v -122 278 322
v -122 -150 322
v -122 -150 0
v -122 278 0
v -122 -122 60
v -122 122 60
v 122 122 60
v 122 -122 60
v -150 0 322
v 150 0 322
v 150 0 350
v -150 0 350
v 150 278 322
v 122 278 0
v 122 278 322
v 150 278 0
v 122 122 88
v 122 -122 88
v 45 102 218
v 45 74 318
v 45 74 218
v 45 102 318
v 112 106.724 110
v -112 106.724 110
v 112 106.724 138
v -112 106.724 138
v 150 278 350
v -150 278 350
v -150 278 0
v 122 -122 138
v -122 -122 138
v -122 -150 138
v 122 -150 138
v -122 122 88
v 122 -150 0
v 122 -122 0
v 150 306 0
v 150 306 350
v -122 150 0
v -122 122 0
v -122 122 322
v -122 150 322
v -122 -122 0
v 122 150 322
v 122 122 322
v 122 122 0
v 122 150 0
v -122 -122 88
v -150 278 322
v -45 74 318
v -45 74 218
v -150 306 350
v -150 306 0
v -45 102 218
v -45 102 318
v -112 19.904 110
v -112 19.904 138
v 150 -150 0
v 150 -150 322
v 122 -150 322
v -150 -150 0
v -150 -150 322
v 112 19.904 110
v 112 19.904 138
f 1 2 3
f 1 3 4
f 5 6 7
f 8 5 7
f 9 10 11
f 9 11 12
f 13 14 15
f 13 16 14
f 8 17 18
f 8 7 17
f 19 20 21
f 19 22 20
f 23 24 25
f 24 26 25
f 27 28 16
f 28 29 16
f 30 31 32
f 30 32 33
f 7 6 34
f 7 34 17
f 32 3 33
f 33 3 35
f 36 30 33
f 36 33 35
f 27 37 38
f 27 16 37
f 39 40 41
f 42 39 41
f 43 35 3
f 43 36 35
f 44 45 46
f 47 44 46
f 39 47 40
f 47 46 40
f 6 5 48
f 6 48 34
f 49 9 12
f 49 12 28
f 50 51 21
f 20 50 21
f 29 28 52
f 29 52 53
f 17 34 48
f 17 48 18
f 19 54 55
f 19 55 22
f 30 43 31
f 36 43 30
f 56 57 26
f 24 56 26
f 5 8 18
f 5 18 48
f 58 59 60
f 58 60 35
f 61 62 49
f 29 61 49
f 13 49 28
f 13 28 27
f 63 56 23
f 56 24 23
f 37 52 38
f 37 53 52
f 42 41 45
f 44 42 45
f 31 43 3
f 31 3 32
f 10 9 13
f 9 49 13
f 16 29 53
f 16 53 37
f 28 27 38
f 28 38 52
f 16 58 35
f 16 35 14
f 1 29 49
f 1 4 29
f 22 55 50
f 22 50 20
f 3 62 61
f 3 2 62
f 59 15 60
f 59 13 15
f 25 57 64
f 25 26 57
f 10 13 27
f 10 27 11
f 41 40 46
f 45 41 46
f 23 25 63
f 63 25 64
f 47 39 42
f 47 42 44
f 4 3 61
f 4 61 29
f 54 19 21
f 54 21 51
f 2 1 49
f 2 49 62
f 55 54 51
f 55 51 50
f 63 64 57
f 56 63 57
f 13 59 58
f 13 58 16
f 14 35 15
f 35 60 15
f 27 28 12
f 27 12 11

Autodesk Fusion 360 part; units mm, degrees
ref_plane "WorkPlane1" through (0, 0, 60) normal (0, 0, 1) x (1, 0, 0) in component "Base"
sketch "Sketch1" plane through (0, 0, 60) normal (0, 0, 1) x (1, 0, 0) in component "Base"
  line L0 (122, -122) -> (-122, -122)
  line L1 (-122, -122) -> (-122, 122)
  line L2 (-122, 122) -> (122, 122)
  line L3 (122, 122) -> (122, -122)
  line L4 (122, -122) -> (-122, 122) construction
  line L5 (-122, -122) -> (122, 122) construction
  dimension "d8" = 244
  dimension "d9" = 244
extrude "Extrude1" add sketch "Sketch1" along normal blind 28 makes body 1 in component "Base"
ref_plane "WorkPlane1" through (0, -122, 0) normal (0, 1, 0) x (0, 0, 1) in component "Front"
sketch "Sketch1 (2)" plane through (0, -122, 0) normal (0, 1, 0) x (1, 0, 0) in component "Front"
  line L0 (122, 0) -> (-122, 0)
  line L1 (-122, 0) -> (-122, -138)
  line L2 (-122, -138) -> (122, -138)
  line L3 (122, -138) -> (122, 0)
  line L4 (122, 0) -> (-122, -138) construction
  line L5 (-122, 0) -> (122, -138) construction
  point P0 (0, -69)
  dimension "d15" = 244
  dimension "d16" = 138
extrude "Extrude1'" add sketch "Sketch1 (2)" against normal blind 28 separate body makes body 2 in component "Front"
ref_plane "WorkPlane1" through (0, 122, 0) normal (0, 1, 0) x (0, 0, 1) in component "Rear"
sketch "Sketch1 (3)" plane through (0, 122, 0) normal (0, 1, 0) x (1, 0, 0) in component "Rear"
  line L0 (-122, -322) -> (122, -322)
  line L1 (122, -322) -> (122, 0)
  line L2 (122, 0) -> (-122, 0)
  line L3 (-122, 0) -> (-122, -322)
  line L4 (-122, -322) -> (122, 0) construction
  line L5 (122, -322) -> (-122, 0) construction
  point P0 (0, -161)
  dimension "d21" = 244
  dimension "d22" = 322
extrude "Extrude1''" add sketch "Sketch1 (3)" along normal blind 28 separate body makes body 3 in component "Rear"
ref_plane "WorkPlane1" through (-122, 0, 0) normal (1, 0, 0) x (0, 1, 0) in component "Side"
sketch "Sketch1 (4)" plane through (-122, 0, 0) normal (1, 0, 0) x (0, 1, 0) in component "Side"
  line L0 (-150, 0) -> (278, 0)
  line L1 (278, 0) -> (278, 322)
  line L2 (278, 322) -> (-150, 322)
  line L3 (-150, 322) -> (-150, 0)
  line L4 (-150, 0) -> (278, 322) construction
  line L5 (278, 0) -> (-150, 322) construction
  point P0 (64, 161)
  dimension "d26" = 428
  dimension "d27" = 322
  dimension "d32" = 150
extrude "Extrude1'''" add sketch "Sketch1 (4)" against normal blind 28 separate body makes body 4 in component "Side"
ref_plane "WorkPlane1" through (0, 0, 322) normal (0, 0, 1) x (1, 0, 0) in component "Top"
sketch "Sketch1 (5)" plane through (0, 0, 322) normal (0, 0, 1) x (1, 0, 0) in component "Top"
  line L0 (-150, 278) -> (150, 278)
  line L1 (150, 278) -> (150, 0)
  line L2 (150, 0) -> (-150, 0)
  line L3 (-150, 0) -> (-150, 278)
  dimension "d36" = 300
  dimension "d38" = 278
extrude "Extrude1''''" add sketch "Sketch1 (5)" along normal blind 28 separate body makes body 5 in component "Top"
ref_plane "WorkPlane1" through (0, 278, 0) normal (0, 1, 0) x (0, 0, 1) in component "RearCap"
sketch "Sketch1 (6)" plane through (0, 278, 0) normal (0, 1, 0) x (1, 0, 0) in component "RearCap"
  line L0 (150, -350) -> (-150, -350)
  line L1 (-150, -350) -> (-150, 0)
  line L2 (-150, 0) -> (150, 0)
  line L3 (150, 0) -> (150, -350)
  dimension "d42" = 300
  dimension "d43" = 350
extrude "Extrude1'''''" add sketch "Sketch1 (6)" along normal blind 28 separate body makes body 6 in component "RearCap"
ref_plane "WorkPlane1" through (0, 0, 138) normal (0, 0, 1) x (1, 0, 0) in component "SpoilBoard"
sketch "Sketch1 (7)" plane through (0, 0, 138) normal (0, 0, 1) x (1, 0, 0) in component "SpoilBoard"
  line L0 (112, -43.4103) -> (-112, -43.4103)
  line L1 (-112, -43.4103) -> (-112, 43.4103)
  line L2 (-112, 43.4103) -> (112, 43.4103)
  line L3 (112, 43.4103) -> (112, -43.4103)
  line L4 (112, -43.4103) -> (-112, 43.4103) construction
  line L5 (-112, -43.4103) -> (112, 43.4103) construction
  dimension "d49" = 224
  dimension "d50" = 86.8207
extrude "Extrude1''''''" add sketch "Sketch1 (7)" against normal blind 28 separate body makes body 7 in component "SpoilBoard"
ref_plane "WorkPlane1" through (0, 122, 0) normal (0, 1, 0) x (0, 0, 1) in component "X-Carriage"
ref_plane "WorkPlane2" through (0, 102, 0) normal (0, 1, 0) x (0, 0, 1) in component "X-Carriage"
sketch "Sketch1 (8)" plane through (0, 102, 0) normal (0, 1, 0) x (1, 0, 0) in component "X-Carriage"
  line L0 (-45, -318) -> (45, -318)
  line L1 (45, -318) -> (45, -218)
  line L2 (45, -218) -> (-45, -218)
  line L3 (-45, -218) -> (-45, -318)
  point P0 (0, -218)
  dimension "d64" = 90
  dimension "d65" = 100
  dimension "d66" = 218
extrude "Extrude1'''''''" add sketch "Sketch1 (8)" against normal blind 28 separate body makes body 8 in component "X-Carriage"
component "Base" placed x (1, 0, 0) y (0, 1, 0) z (0, 0, 1) at (0, 0, 0)
component "Front" placed x (1, 0, 0) y (0, 1, 0) z (0, 0, 1) at (0, 0, 0)
component "Rear" placed x (1, 0, 0) y (0, 1, 0) z (0, 0, 1) at (0, 0, 0)
component "Side" placed x (1, 0, 0) y (0, 1, 0) z (0, 0, 1) at (0, 0, 0)
component "Top" placed x (1, 0, 0) y (0, 1, 0) z (0, 0, 1) at (0, 0, 0)
component "RearCap" placed x (1, 0, 0) y (0, 1, 0) z (0, 0, 1) at (0, 0, 0)
component "SpoilBoard" placed x (1, 0, 0) y (0, 1, 0) z (0, 0, 1) at (0, 63.3138, 0)
component "X-Carriage" placed x (1, 0, 0) y (0, 1, 0) z (0, 0, 1) at (0, 0, 0)
component "Side" placed x (1, 0, 0) y (0, 1, 0) z (0, 0, 1) at (272, 0, 0)
equation "frameThickness = 28 mm"
equation "outsideWidth = baseWidth + frameThickness * 2"
equation "outsideLength = baseLength + rearCavityLength + frameThickness * 3"
equation "bottomCavityHeight = 60 mm"
equation "baseWidth = 244 mm"
equation "baseLength = 244 mm"
equation "d7 = bottomCavityHeight"
equation "d8 = baseWidth"
equation "d9 = baseLength"
equation "d10 = frameThickness"
equation "frontLipHeight = bottomCavityHeight + frameThickness + baseBoxHeight"
equation "baseBoxHeight = 50 mm"
equation "d14 = -baseLength / 2"
equation "d15 = baseWidth"
equation "d16 = frontLipHeight"
equation "d17 = -frameThickness"
equation "d19 = baseLength / 2"
equation "outsideHeight = 350 mm"
equation "d21 = baseWidth"
equation "d22 = rearPanelHeight"
equation "d23 = frameThickness"
equation "d25 = -baseWidth / 2"
equation "d26 = outsideLength"
equation "d27 = sidePanelHeight"
equation "d28 = -frameThickness"
equation "rearCavityLength = 100 mm"
equation "sidePanelLength = outsideLength - frameThickness"
equation "d32 = baseLength / 2 + frameThickness"
equation "sidePanelHeight = outsideHeight - frameThickness"
equation "rearPanelHeight = sidePanelHeight"
equation "d35 = outsideHeight - frameThickness"
equation "d36 = outsideWidth"
equation "topPanelLength = outsideLength - baseLength / 2 - frameThickness"
equation "d38 = topPanelLength"
equation "d39 = frameThickness"
equation "d41 = outsideLength - baseLength / 2 - frameThickness"
equation "d42 = outsideWidth"
equation "d43 = outsideHeight"
equation "d44 = frameThickness"
equation "d46 = frontLipHeight"
equation "spoilBoardWidth = baseWidth - 20 mm"
equation "spoilBoardLength = baseLength / 2 - 20 mm"
equation "d49 = spoilBoardWidth"
equation "d51 = -frameThickness"
equation "d58 = baseLength - spoilBoardLength - 10 mm"
equation "d59 = baseLength / 2"
equation "xCarriageWidth = 90 mm"
equation "xCarriageHeight = 100 mm"
equation "xCarriageElevation = frontLipHeight + 80 mm"
equation "d64 = xCarriageWidth"
equation "d65 = xCarriageHeight"
equation "d66 = xCarriageElevation"
equation "d67 = -frameThickness"
